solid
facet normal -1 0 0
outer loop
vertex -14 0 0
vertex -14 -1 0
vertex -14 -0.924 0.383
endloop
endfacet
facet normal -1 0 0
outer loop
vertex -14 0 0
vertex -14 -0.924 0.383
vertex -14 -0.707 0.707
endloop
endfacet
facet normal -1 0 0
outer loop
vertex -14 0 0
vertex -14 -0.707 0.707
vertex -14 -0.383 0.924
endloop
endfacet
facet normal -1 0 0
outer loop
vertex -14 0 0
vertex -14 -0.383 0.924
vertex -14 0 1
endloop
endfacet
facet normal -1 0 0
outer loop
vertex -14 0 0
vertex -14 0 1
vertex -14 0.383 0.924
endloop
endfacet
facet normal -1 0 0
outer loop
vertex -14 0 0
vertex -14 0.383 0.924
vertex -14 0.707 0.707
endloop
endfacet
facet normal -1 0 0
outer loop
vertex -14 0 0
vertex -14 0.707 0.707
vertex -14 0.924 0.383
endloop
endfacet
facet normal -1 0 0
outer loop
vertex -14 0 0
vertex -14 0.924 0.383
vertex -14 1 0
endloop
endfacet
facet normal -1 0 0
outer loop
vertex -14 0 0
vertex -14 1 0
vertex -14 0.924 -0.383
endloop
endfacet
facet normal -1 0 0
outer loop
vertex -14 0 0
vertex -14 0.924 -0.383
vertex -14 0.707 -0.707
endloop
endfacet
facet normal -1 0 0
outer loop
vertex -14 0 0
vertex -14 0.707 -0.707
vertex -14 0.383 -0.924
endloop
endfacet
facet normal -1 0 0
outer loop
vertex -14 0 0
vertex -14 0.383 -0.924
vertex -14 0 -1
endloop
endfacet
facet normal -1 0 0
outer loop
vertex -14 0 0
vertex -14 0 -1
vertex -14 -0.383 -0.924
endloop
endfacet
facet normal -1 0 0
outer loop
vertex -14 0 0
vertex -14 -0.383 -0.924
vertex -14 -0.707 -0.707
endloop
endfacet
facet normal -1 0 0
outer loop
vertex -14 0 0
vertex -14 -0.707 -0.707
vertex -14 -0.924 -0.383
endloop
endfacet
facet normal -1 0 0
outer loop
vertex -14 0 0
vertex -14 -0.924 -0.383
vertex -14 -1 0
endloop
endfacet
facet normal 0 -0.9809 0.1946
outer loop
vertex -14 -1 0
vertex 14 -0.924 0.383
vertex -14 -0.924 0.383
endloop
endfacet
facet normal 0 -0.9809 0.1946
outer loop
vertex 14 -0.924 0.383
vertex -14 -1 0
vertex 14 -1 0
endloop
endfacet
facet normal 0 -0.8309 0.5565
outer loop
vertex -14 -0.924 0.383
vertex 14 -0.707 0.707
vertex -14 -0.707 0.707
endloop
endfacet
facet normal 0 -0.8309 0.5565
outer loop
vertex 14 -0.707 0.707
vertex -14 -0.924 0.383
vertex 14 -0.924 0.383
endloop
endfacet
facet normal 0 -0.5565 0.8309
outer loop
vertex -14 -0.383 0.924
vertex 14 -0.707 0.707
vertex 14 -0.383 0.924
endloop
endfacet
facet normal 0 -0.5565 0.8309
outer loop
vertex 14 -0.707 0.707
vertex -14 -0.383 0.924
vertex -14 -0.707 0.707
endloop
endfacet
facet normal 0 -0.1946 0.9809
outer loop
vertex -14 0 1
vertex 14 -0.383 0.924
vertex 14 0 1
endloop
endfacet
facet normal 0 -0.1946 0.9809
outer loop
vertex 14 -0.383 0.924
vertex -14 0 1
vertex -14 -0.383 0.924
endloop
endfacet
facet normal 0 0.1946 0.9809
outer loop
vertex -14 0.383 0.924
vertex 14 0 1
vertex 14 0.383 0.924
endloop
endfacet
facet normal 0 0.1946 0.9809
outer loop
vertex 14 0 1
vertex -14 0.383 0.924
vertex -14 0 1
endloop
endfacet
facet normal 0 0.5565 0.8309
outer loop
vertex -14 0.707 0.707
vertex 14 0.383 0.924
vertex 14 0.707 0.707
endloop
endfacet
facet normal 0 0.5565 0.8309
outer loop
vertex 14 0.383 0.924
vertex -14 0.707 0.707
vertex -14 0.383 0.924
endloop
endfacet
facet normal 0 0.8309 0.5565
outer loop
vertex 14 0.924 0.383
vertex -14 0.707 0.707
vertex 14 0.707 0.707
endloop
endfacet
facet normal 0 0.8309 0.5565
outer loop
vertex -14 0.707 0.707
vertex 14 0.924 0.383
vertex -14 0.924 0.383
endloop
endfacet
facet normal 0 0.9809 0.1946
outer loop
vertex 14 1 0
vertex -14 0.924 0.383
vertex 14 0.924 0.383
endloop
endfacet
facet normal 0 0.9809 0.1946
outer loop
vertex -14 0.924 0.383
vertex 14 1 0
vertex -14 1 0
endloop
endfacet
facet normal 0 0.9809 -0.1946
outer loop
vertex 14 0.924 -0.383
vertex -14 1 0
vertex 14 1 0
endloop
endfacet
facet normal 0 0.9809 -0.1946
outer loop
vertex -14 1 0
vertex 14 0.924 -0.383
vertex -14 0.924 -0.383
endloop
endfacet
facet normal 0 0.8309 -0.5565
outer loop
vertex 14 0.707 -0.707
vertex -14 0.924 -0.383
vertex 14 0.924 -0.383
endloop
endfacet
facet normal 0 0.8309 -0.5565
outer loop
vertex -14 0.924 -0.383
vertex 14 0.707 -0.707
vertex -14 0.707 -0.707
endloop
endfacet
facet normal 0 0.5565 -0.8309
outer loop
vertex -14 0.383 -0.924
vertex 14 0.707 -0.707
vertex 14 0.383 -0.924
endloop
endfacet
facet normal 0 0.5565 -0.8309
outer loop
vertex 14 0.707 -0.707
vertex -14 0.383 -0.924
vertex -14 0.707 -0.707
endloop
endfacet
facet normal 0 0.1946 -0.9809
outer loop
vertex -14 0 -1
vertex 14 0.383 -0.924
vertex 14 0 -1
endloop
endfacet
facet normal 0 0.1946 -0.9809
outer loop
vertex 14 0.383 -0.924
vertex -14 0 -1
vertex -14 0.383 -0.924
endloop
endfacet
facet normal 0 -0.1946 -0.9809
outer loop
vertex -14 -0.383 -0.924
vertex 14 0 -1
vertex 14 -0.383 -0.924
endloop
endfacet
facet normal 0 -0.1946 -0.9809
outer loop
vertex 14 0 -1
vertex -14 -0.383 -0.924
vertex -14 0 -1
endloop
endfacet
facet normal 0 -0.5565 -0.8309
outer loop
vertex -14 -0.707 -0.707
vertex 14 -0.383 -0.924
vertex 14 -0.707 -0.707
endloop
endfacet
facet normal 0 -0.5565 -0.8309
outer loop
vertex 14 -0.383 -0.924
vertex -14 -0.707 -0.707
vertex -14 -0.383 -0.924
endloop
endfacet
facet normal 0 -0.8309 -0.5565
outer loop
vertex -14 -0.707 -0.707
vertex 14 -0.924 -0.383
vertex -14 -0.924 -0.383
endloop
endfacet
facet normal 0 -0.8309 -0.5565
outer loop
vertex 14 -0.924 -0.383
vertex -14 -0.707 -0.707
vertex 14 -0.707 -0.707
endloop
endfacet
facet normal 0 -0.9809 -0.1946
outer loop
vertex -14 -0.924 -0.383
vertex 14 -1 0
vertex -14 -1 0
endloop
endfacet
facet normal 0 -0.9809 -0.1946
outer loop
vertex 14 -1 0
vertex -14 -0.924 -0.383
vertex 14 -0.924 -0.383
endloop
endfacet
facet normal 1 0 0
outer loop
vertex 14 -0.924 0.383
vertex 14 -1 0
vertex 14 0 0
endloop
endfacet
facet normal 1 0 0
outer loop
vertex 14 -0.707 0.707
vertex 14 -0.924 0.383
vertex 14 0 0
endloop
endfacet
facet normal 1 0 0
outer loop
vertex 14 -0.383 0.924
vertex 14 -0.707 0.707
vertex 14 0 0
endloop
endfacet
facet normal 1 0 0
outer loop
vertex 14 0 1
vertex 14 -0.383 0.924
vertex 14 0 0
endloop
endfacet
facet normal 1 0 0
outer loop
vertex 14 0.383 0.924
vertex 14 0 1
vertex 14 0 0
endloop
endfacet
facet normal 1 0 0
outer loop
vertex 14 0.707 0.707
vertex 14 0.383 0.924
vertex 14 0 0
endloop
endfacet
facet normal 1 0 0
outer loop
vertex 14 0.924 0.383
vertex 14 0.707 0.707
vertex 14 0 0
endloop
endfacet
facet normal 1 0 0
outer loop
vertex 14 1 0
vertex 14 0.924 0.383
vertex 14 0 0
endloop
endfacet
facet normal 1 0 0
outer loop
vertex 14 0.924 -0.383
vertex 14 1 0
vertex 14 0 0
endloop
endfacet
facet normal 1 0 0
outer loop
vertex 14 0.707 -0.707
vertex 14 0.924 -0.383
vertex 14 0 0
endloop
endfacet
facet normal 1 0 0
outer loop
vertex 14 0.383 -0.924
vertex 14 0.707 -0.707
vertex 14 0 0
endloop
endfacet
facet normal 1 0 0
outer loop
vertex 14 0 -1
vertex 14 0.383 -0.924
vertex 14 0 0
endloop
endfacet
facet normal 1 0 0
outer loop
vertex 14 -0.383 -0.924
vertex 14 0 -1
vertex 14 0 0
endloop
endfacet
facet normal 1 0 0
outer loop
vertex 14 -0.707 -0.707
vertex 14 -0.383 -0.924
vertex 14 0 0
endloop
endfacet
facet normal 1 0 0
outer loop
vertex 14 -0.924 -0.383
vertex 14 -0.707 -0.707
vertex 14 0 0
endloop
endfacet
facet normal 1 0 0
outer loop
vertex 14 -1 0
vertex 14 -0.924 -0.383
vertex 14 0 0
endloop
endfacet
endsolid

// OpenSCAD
// file: ../p/4-4edge.scad
use <../lib.scad>
function ldraw_lib__4_4edge() = [
// 0 Circle 1.0
// 0 Name: 4-4edge.dat
// 0 Author: James Jessiman
// 0 !LDRAW_ORG Primitive UPDATE 2017-01
// 0 !LICENSE Licensed under CC BY 2.0 and CC BY 4.0 : see CAreadme.txt
// 
// 0 BFC CERTIFY CCW
  [0,"BFC","CERTIFY"],
  [0,"BFC","CCW"],
// 
// 0 !HISTORY 1998-12-15 [PTadmin] Official Update 1998-10
// 0 !HISTORY 2005-12-28 [PTadmin] Official Update 2005-01
// 0 !HISTORY 2007-06-24 [PTadmin] Header formatted for Contributor Agreement
// 0 !HISTORY 2008-07-01 [PTadmin] Official Update 2008-01
// 0 !HISTORY 2017-01-15 [Steffen] BFCed
// 0 !HISTORY 2017-12-30 [PTadmin] Official Update 2017-01
// 
// 
// 2 24 1 0 0 0.9239 0 0.3827
  [2,24,1,0,0,0.9239,0,0.3827],
// 2 24 0.9239 0 0.3827 0.7071 0 0.7071
  [2,24,0.9239,0,0.3827,0.7071,0,0.7071],
// 2 24 0.7071 0 0.7071 0.3827 0 0.9239
  [2,24,0.7071,0,0.7071,0.3827,0,0.9239],
// 2 24 0.3827 0 0.9239 0 0 1
  [2,24,0.3827,0,0.9239,0,0,1],
// 2 24 0 0 1 -0.3827 0 0.9239
  [2,24,0,0,1,-0.3827,0,0.9239],
// 2 24 -0.3827 0 0.9239 -0.7071 0 0.7071
  [2,24,-0.3827,0,0.9239,-0.7071,0,0.7071],
// 2 24 -0.7071 0 0.7071 -0.9239 0 0.3827
  [2,24,-0.7071,0,0.7071,-0.9239,0,0.3827],
// 2 24 -0.9239 0 0.3827 -1 0 -0
  [2,24,-0.9239,0,0.3827,-1,0,-0],
// 2 24 -1 0 -0 -0.9239 0 -0.3827
  [2,24,-1,0,-0,-0.9239,0,-0.3827],
// 2 24 -0.9239 0 -0.3827 -0.7071 0 -0.7071
  [2,24,-0.9239,0,-0.3827,-0.7071,0,-0.7071],
// 2 24 -0.7071 0 -0.7071 -0.3827 0 -0.9239
  [2,24,-0.7071,0,-0.7071,-0.3827,0,-0.9239],
// 2 24 -0.3827 0 -0.9239 0 0 -1
  [2,24,-0.3827,0,-0.9239,0,0,-1],
// 2 24 0 0 -1 0.3827 0 -0.9239
  [2,24,0,0,-1,0.3827,0,-0.9239],
// 2 24 0.3827 0 -0.9239 0.7071 0 -0.7071
  [2,24,0.3827,0,-0.9239,0.7071,0,-0.7071],
// 2 24 0.7071 0 -0.7071 0.9239 0 -0.3827
  [2,24,0.7071,0,-0.7071,0.9239,0,-0.3827],
// 2 24 0.9239 0 -0.3827 1 0 0
  [2,24,0.9239,0,-0.3827,1,0,0],
];
module ldraw_lib__4_4edge(step=0, col=false, unit=2/5, alt=false, line=0.2, solid=!$preview)
    makepoly(ldraw_lib__4_4edge(), step=step, col=col, unit=unit, alt=alt, line=line, solid=solid);
ldraw_lib__4_4edge(line=0.2);
// file: ../p/4-4cyli.scad
use <../lib.scad>
function ldraw_lib__4_4cyli() = [
// 0 Cylinder 1.0
// 0 Name: 4-4cyli.dat
// 0 Author: James Jessiman
// 0 !LDRAW_ORG Primitive UPDATE 2005-01
// 0 !LICENSE Licensed under CC BY 2.0 and CC BY 4.0 : see CAreadme.txt
// 
// 0 BFC CERTIFY CCW
  [0,"BFC","CERTIFY"],
  [0,"BFC","CCW"],
// 
// 0 !HISTORY 1998-12-15 [PTadmin] Official Update 1998-10
// 0 !HISTORY 2002-03-23 [sbliss] Added BFC statement; merged headers from files in distributions LDraw 0.27 and Complete.
// 0 !HISTORY 2002-04-25 [PTadmin] Official Update 2002-02
// 0 !HISTORY 2004-12-14 [guyvivan] BFC CCW
// 0 !HISTORY 2005-12-28 [PTadmin] Official Update 2005-01
// 0 !HISTORY 2007-06-24 [PTadmin] Header formatted for Contributor Agreement
// 0 !HISTORY 2008-07-01 [PTadmin] Official Update 2008-01
// 
// 
// 4 16 1 1 0 0.9239 1 0.3827 0.9239 0 0.3827 1 0 0
  [4,16,1,1,0,0.9239,1,0.3827,0.9239,0,0.3827,1,0,0],
// 5 24 1 0 0 1 1 0 0.9239 0 0.3827 0.9239 0 -0.3827
  [5,24,1,0,0,1,1,0,0.9239,0,0.3827,0.9239,0,-0.3827],
// 4 16 0.9239 1 0.3827 0.7071 1 0.7071 0.7071 0 0.7071 0.9239 0 0.3827
  [4,16,0.9239,1,0.3827,0.7071,1,0.7071,0.7071,0,0.7071,0.9239,0,0.3827],
// 5 24 0.9239 0 0.3827 0.9239 1 0.3827 0.7071 0 0.7071 1 0 0
  [5,24,0.9239,0,0.3827,0.9239,1,0.3827,0.7071,0,0.7071,1,0,0],
// 4 16 0.7071 1 0.7071 0.3827 1 0.9239 0.3827 0 0.9239 0.7071 0 0.7071
  [4,16,0.7071,1,0.7071,0.3827,1,0.9239,0.3827,0,0.9239,0.7071,0,0.7071],
// 5 24 0.7071 0 0.7071 0.7071 1 0.7071 0.3827 0 0.9239 0.9239 0 0.3827
  [5,24,0.7071,0,0.7071,0.7071,1,0.7071,0.3827,0,0.9239,0.9239,0,0.3827],
// 4 16 0.3827 1 0.9239 0 1 1 0 0 1 0.3827 0 0.9239
  [4,16,0.3827,1,0.9239,0,1,1,0,0,1,0.3827,0,0.9239],
// 5 24 0.3827 0 0.9239 0.3827 1 0.9239 0 0 1 0.7071 0 0.7071
  [5,24,0.3827,0,0.9239,0.3827,1,0.9239,0,0,1,0.7071,0,0.7071],
// 4 16 0 1 1 -0.3827 1 0.9239 -0.3827 0 0.9239 0 0 1
  [4,16,0,1,1,-0.3827,1,0.9239,-0.3827,0,0.9239,0,0,1],
// 5 24 0 0 1 0 1 1 -0.3827 0 0.9239 0.3827 0 0.9239
  [5,24,0,0,1,0,1,1,-0.3827,0,0.9239,0.3827,0,0.9239],
// 4 16 -0.3827 1 0.9239 -0.7071 1 0.7071 -0.7071 0 0.7071 -0.3827 0 0.9239
  [4,16,-0.3827,1,0.9239,-0.7071,1,0.7071,-0.7071,0,0.7071,-0.3827,0,0.9239],
// 5 24 -0.3827 0 0.9239 -0.3827 1 0.9239 -0.7071 0 0.7071 0 0 1
  [5,24,-0.3827,0,0.9239,-0.3827,1,0.9239,-0.7071,0,0.7071,0,0,1],
// 4 16 -0.7071 1 0.7071 -0.9239 1 0.3827 -0.9239 0 0.3827 -0.7071 0 0.7071
  [4,16,-0.7071,1,0.7071,-0.9239,1,0.3827,-0.9239,0,0.3827,-0.7071,0,0.7071],
// 5 24 -0.7071 0 0.7071 -0.7071 1 0.7071 -0.9239 0 0.3827 -0.3827 0 0.9239
  [5,24,-0.7071,0,0.7071,-0.7071,1,0.7071,-0.9239,0,0.3827,-0.3827,0,0.9239],
// 4 16 -0.9239 1 0.3827 -1 1 0 -1 0 0 -0.9239 0 0.3827
  [4,16,-0.9239,1,0.3827,-1,1,0,-1,0,0,-0.9239,0,0.3827],
// 5 24 -0.9239 0 0.3827 -0.9239 1 0.3827 -1 0 0 -0.7071 0 0.7071
  [5,24,-0.9239,0,0.3827,-0.9239,1,0.3827,-1,0,0,-0.7071,0,0.7071],
// 4 16 -1 1 0 -0.9239 1 -0.3827 -0.9239 0 -0.3827 -1 0 0
  [4,16,-1,1,0,-0.9239,1,-0.3827,-0.9239,0,-0.3827,-1,0,0],
// 5 24 -1 0 0 -1 1 0 -0.9239 0 -0.3827 -0.9239 0 0.3827
  [5,24,-1,0,0,-1,1,0,-0.9239,0,-0.3827,-0.9239,0,0.3827],
// 4 16 -0.9239 1 -0.3827 -0.7071 1 -0.7071 -0.7071 0 -0.7071 -0.9239 0 -0.3827
  [4,16,-0.9239,1,-0.3827,-0.7071,1,-0.7071,-0.7071,0,-0.7071,-0.9239,0,-0.3827],
// 5 24 -0.9239 0 -0.3827 -0.9239 1 -0.3827 -0.7071 0 -0.7071 -1 0 0
  [5,24,-0.9239,0,-0.3827,-0.9239,1,-0.3827,-0.7071,0,-0.7071,-1,0,0],
// 4 16 -0.7071 1 -0.7071 -0.3827 1 -0.9239 -0.3827 0 -0.9239 -0.7071 0 -0.7071
  [4,16,-0.7071,1,-0.7071,-0.3827,1,-0.9239,-0.3827,0,-0.9239,-0.7071,0,-0.7071],
// 5 24 -0.7071 0 -0.7071 -0.7071 1 -0.7071 -0.3827 0 -0.9239 -0.9239 0 -0.3827
  [5,24,-0.7071,0,-0.7071,-0.7071,1,-0.7071,-0.3827,0,-0.9239,-0.9239,0,-0.3827],
// 4 16 -0.3827 1 -0.9239 0 1 -1 0 0 -1 -0.3827 0 -0.9239
  [4,16,-0.3827,1,-0.9239,0,1,-1,0,0,-1,-0.3827,0,-0.9239],
// 5 24 -0.3827 0 -0.9239 -0.3827 1 -0.9239 0 0 -1 -0.7071 0 -0.7071
  [5,24,-0.3827,0,-0.9239,-0.3827,1,-0.9239,0,0,-1,-0.7071,0,-0.7071],
// 4 16 0 1 -1 0.3827 1 -0.9239 0.3827 0 -0.9239 0 0 -1
  [4,16,0,1,-1,0.3827,1,-0.9239,0.3827,0,-0.9239,0,0,-1],
// 5 24 0 0 -1 0 1 -1 0.3827 0 -0.9239 -0.3827 0 -0.9239
  [5,24,0,0,-1,0,1,-1,0.3827,0,-0.9239,-0.3827,0,-0.9239],
// 4 16 0.3827 1 -0.9239 0.7071 1 -0.7071 0.7071 0 -0.7071 0.3827 0 -0.9239
  [4,16,0.3827,1,-0.9239,0.7071,1,-0.7071,0.7071,0,-0.7071,0.3827,0,-0.9239],
// 5 24 0.3827 0 -0.9239 0.3827 1 -0.9239 0.7071 0 -0.7071 0 0 -1
  [5,24,0.3827,0,-0.9239,0.3827,1,-0.9239,0.7071,0,-0.7071,0,0,-1],
// 4 16 0.7071 1 -0.7071 0.9239 1 -0.3827 0.9239 0 -0.3827 0.7071 0 -0.7071
  [4,16,0.7071,1,-0.7071,0.9239,1,-0.3827,0.9239,0,-0.3827,0.7071,0,-0.7071],
// 5 24 0.7071 0 -0.7071 0.7071 1 -0.7071 0.9239 0 -0.3827 0.3827 0 -0.9239
  [5,24,0.7071,0,-0.7071,0.7071,1,-0.7071,0.9239,0,-0.3827,0.3827,0,-0.9239],
// 4 16 0.9239 1 -0.3827 1 1 0 1 0 0 0.9239 0 -0.3827
  [4,16,0.9239,1,-0.3827,1,1,0,1,0,0,0.9239,0,-0.3827],
// 5 24 0.9239 0 -0.3827 0.9239 1 -0.3827 1 0 0 0.7071 0 -0.7071
  [5,24,0.9239,0,-0.3827,0.9239,1,-0.3827,1,0,0,0.7071,0,-0.7071],
// 0
];
module ldraw_lib__4_4cyli(step=0, col=false, unit=2/5, alt=false, line=0.2, solid=!$preview)
    makepoly(ldraw_lib__4_4cyli(), step=step, col=col, unit=unit, alt=alt, line=line, solid=solid);
ldraw_lib__4_4cyli(line=0.2);
// file: ../p/4-4disc.scad
use <../lib.scad>
function ldraw_lib__4_4disc() = [
// 0 Disc 1.0
// 0 Name: 4-4disc.dat
// 0 Author: James Jessiman
// 0 !LDRAW_ORG Primitive UPDATE 2002-02
// 0 !LICENSE Licensed under CC BY 2.0 and CC BY 4.0 : see CAreadme.txt
// 
// 0 BFC CERTIFY CCW
  [0,"BFC","CERTIFY"],
  [0,"BFC","CCW"],
// 
// 0 !HISTORY 1998-12-15 [PTadmin] Official Update 1998-10
// 0 !HISTORY 2002-03-23 [sbliss] Added BFC statement
// 0 !HISTORY 2002-04-25 [PTadmin] Official Update 2002-02
// 0 !HISTORY 2007-06-24 [PTadmin] Header formatted for Contributor Agreement
// 0 !HISTORY 2008-07-01 [PTadmin] Official Update 2008-01
// 
// 
// 3 16 0 0 0 1 0 0 0.9239 0 0.3827
  [3,16,0,0,0,1,0,0,0.9239,0,0.3827],
// 3 16 0 0 0 0.9239 0 0.3827 0.7071 0 0.7071
  [3,16,0,0,0,0.9239,0,0.3827,0.7071,0,0.7071],
// 3 16 0 0 0 0.7071 0 0.7071 0.3827 0 0.9239
  [3,16,0,0,0,0.7071,0,0.7071,0.3827,0,0.9239],
// 3 16 0 0 0 0.3827 0 0.9239 0 0 1
  [3,16,0,0,0,0.3827,0,0.9239,0,0,1],
// 3 16 0 0 0 0 0 1 -0.3827 0 0.9239
  [3,16,0,0,0,0,0,1,-0.3827,0,0.9239],
// 3 16 0 0 0 -0.3827 0 0.9239 -0.7071 0 0.7071
  [3,16,0,0,0,-0.3827,0,0.9239,-0.7071,0,0.7071],
// 3 16 0 0 0 -0.7071 0 0.7071 -0.9239 0 0.3827
  [3,16,0,0,0,-0.7071,0,0.7071,-0.9239,0,0.3827],
// 3 16 0 0 0 -0.9239 0 0.3827 -1 0 -0
  [3,16,0,0,0,-0.9239,0,0.3827,-1,0,-0],
// 3 16 0 0 0 -1 0 -0 -0.9239 0 -0.3827
  [3,16,0,0,0,-1,0,-0,-0.9239,0,-0.3827],
// 3 16 0 0 0 -0.9239 0 -0.3827 -0.7071 0 -0.7071
  [3,16,0,0,0,-0.9239,0,-0.3827,-0.7071,0,-0.7071],
// 3 16 0 0 0 -0.7071 0 -0.7071 -0.3827 0 -0.9239
  [3,16,0,0,0,-0.7071,0,-0.7071,-0.3827,0,-0.9239],
// 3 16 0 0 0 -0.3827 0 -0.9239 0 0 -1
  [3,16,0,0,0,-0.3827,0,-0.9239,0,0,-1],
// 3 16 0 0 0 0 0 -1 0.3827 0 -0.9239
  [3,16,0,0,0,0,0,-1,0.3827,0,-0.9239],
// 3 16 0 0 0 0.3827 0 -0.9239 0.7071 0 -0.7071
  [3,16,0,0,0,0.3827,0,-0.9239,0.7071,0,-0.7071],
// 3 16 0 0 0 0.7071 0 -0.7071 0.9239 0 -0.3827
  [3,16,0,0,0,0.7071,0,-0.7071,0.9239,0,-0.3827],
// 3 16 0 0 0 0.9239 0 -0.3827 1 0 0
  [3,16,0,0,0,0.9239,0,-0.3827,1,0,0],
// 0
];
module ldraw_lib__4_4disc(step=0, col=false, unit=2/5, alt=false, line=0.2, solid=!$preview)
    makepoly(ldraw_lib__4_4disc(), step=step, col=col, unit=unit, alt=alt, line=line, solid=solid);
ldraw_lib__4_4disc(line=0.2);
// file: ../p/4-4cylc.scad
use <../lib.scad>
use <4-4cyli.scad>
use <4-4disc.scad>
use <4-4edge.scad>
function ldraw_lib__4_4cylc() = [
// 0 Cylinder Closed 1.0
// 0 Name: 4-4cylc.dat
// 0 Author: Alex Taylor [anathema]
// 0 !LDRAW_ORG Primitive UPDATE 2009-02
// 0 !LICENSE Licensed under CC BY 2.0 and CC BY 4.0 : see CAreadme.txt
// 
// 0 BFC CERTIFY CCW
  [0,"BFC","CERTIFY"],
  [0,"BFC","CCW"],
// 
// 0 !HISTORY 2008-12-29 [cwdee] Removed one disc
// 0 !HISTORY 2009-09-03 [PTadmin] Official Update 2009-02
// 
// 
// 1 16 0 0 0 1 0 0 0 1 0 0 0 1 4-4edge.dat
  [1,16,0,0,0,1,0,0,0,1,0,0,0,1, ldraw_lib__4_4edge()],
// 1 16 0 1 0 1 0 0 0 1 0 0 0 1 4-4edge.dat
  [1,16,0,1,0,1,0,0,0,1,0,0,0,1, ldraw_lib__4_4edge()],
// 1 16 0 0 0 1 0 0 0 1 0 0 0 1 4-4disc.dat
  [1,16,0,0,0,1,0,0,0,1,0,0,0,1, ldraw_lib__4_4disc()],
// 1 16 0 0 0 1 0 0 0 1 0 0 0 1 4-4cyli.dat
  [1,16,0,0,0,1,0,0,0,1,0,0,0,1, ldraw_lib__4_4cyli()],
// 0
];
module ldraw_lib__4_4cylc(step=0, col=false, unit=2/5, alt=false, line=0.2, solid=!$preview)
    makepoly(ldraw_lib__4_4cylc(), step=step, col=col, unit=unit, alt=alt, line=line, solid=solid);
ldraw_lib__4_4cylc(line=0.2);
// main file
use <../lib.scad>
use <../p/4-4cylc.scad>
use <../p/4-4disc.scad>
function ldraw_lib__u9082() = [
// 0 ~Axle Steel  5 x 70 LDU
// 0 Name: u9082.dat
// 0 Author: Ingolf Weisheit [stahlwollschaf]
// 0 !LDRAW_ORG Part UPDATE 2014-02
// 0 !LICENSE Licensed under CC BY 2.0 and CC BY 4.0 : see CAreadme.txt
// 
// 0 BFC CERTIFY CCW
  [0,"BFC","CERTIFY"],
  [0,"BFC","CCW"],
// 
// 0 !CATEGORY Vehicle
// 0 !KEYWORDS 11767, Chima, Flywheel, Rip Cord, Speedorz
// 
// 0 !HISTORY 2014-12-23 [PTadmin] Official Update 2014-02
// 
// 
// 1 16 -35 0 0 0 70 0 0 0 -2.5 -2.5 0 0 4-4cylc.dat
  [1,16,-35,0,0,0,70,0,0,0,-2.5,-2.5,0,0, ldraw_lib__4_4cylc()],
// 1 16 35 0 0 0 -1 0 0 0 -2.5 -2.5 0 0 4-4disc.dat
  [1,16,35,0,0,0,-1,0,0,0,-2.5,-2.5,0,0, ldraw_lib__4_4disc()],
];
module ldraw_lib__u9082(step=0, col=false, unit=2/5, alt=false, line=0.2, solid=!$preview)
    makepoly(ldraw_lib__u9082(), step=step, col=col, unit=unit, alt=alt, line=line, solid=solid);
ldraw_lib__u9082(line=0.2);
